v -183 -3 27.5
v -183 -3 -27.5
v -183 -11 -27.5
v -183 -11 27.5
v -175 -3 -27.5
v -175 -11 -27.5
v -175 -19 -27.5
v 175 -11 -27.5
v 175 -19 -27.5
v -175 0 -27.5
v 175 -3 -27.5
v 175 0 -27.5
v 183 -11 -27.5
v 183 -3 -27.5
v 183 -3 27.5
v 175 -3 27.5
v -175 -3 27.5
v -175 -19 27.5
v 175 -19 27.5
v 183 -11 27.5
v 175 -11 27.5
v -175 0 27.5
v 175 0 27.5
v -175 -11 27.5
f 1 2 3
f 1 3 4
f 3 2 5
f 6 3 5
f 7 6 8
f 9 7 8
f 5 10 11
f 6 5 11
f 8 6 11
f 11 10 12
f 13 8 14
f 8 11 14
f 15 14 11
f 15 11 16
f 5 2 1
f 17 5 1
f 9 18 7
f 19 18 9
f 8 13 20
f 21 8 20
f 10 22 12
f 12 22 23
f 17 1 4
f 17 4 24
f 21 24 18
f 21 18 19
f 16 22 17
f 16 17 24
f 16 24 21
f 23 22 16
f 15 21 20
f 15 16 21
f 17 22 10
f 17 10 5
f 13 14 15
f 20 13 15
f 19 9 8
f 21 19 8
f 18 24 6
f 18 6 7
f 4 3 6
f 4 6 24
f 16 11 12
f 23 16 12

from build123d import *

# Parameters (mm, degrees)
F0_W     = 366
F0_H     = 55
F1_DEPTH = 19
F2_W     = 8
F2_H     = 55
F2_W_2   = 3
F3_DEPTH = 8
F4_W     = 8
F4_H     = 55
F4_W_2   = 3
F5_DEPTH = 8


with BuildPart() as f1:
    # F0 (on Front) → F1 (new body)
    with BuildSketch(Plane.XZ):
        Rectangle(F0_W, F0_H)
    extrude(amount=F1_DEPTH)

    # F2 (on face) → F3 (cut)
    with BuildSketch(Plane.YZ.offset(183)):
        with Locations((-15, 0)):
            Rectangle(F2_W, F2_H)
        with Locations((-1.5, 0)):
            Rectangle(F2_W_2, F2_H)
    extrude(amount=-F3_DEPTH, mode=Mode.SUBTRACT)

    # F4 (on face) → F5 (cut)
    with BuildSketch(Plane(origin=(-183, 0, 0), x_dir=(0, -1, 0), z_dir=(-1, 0, 0))):
        with Locations((15, 0)):
            Rectangle(F4_W, F4_H)
        with Locations((1.5, 0)):
            Rectangle(F4_W_2, F4_H)
    extrude(amount=-F5_DEPTH, mode=Mode.SUBTRACT)


solid = f1.part
